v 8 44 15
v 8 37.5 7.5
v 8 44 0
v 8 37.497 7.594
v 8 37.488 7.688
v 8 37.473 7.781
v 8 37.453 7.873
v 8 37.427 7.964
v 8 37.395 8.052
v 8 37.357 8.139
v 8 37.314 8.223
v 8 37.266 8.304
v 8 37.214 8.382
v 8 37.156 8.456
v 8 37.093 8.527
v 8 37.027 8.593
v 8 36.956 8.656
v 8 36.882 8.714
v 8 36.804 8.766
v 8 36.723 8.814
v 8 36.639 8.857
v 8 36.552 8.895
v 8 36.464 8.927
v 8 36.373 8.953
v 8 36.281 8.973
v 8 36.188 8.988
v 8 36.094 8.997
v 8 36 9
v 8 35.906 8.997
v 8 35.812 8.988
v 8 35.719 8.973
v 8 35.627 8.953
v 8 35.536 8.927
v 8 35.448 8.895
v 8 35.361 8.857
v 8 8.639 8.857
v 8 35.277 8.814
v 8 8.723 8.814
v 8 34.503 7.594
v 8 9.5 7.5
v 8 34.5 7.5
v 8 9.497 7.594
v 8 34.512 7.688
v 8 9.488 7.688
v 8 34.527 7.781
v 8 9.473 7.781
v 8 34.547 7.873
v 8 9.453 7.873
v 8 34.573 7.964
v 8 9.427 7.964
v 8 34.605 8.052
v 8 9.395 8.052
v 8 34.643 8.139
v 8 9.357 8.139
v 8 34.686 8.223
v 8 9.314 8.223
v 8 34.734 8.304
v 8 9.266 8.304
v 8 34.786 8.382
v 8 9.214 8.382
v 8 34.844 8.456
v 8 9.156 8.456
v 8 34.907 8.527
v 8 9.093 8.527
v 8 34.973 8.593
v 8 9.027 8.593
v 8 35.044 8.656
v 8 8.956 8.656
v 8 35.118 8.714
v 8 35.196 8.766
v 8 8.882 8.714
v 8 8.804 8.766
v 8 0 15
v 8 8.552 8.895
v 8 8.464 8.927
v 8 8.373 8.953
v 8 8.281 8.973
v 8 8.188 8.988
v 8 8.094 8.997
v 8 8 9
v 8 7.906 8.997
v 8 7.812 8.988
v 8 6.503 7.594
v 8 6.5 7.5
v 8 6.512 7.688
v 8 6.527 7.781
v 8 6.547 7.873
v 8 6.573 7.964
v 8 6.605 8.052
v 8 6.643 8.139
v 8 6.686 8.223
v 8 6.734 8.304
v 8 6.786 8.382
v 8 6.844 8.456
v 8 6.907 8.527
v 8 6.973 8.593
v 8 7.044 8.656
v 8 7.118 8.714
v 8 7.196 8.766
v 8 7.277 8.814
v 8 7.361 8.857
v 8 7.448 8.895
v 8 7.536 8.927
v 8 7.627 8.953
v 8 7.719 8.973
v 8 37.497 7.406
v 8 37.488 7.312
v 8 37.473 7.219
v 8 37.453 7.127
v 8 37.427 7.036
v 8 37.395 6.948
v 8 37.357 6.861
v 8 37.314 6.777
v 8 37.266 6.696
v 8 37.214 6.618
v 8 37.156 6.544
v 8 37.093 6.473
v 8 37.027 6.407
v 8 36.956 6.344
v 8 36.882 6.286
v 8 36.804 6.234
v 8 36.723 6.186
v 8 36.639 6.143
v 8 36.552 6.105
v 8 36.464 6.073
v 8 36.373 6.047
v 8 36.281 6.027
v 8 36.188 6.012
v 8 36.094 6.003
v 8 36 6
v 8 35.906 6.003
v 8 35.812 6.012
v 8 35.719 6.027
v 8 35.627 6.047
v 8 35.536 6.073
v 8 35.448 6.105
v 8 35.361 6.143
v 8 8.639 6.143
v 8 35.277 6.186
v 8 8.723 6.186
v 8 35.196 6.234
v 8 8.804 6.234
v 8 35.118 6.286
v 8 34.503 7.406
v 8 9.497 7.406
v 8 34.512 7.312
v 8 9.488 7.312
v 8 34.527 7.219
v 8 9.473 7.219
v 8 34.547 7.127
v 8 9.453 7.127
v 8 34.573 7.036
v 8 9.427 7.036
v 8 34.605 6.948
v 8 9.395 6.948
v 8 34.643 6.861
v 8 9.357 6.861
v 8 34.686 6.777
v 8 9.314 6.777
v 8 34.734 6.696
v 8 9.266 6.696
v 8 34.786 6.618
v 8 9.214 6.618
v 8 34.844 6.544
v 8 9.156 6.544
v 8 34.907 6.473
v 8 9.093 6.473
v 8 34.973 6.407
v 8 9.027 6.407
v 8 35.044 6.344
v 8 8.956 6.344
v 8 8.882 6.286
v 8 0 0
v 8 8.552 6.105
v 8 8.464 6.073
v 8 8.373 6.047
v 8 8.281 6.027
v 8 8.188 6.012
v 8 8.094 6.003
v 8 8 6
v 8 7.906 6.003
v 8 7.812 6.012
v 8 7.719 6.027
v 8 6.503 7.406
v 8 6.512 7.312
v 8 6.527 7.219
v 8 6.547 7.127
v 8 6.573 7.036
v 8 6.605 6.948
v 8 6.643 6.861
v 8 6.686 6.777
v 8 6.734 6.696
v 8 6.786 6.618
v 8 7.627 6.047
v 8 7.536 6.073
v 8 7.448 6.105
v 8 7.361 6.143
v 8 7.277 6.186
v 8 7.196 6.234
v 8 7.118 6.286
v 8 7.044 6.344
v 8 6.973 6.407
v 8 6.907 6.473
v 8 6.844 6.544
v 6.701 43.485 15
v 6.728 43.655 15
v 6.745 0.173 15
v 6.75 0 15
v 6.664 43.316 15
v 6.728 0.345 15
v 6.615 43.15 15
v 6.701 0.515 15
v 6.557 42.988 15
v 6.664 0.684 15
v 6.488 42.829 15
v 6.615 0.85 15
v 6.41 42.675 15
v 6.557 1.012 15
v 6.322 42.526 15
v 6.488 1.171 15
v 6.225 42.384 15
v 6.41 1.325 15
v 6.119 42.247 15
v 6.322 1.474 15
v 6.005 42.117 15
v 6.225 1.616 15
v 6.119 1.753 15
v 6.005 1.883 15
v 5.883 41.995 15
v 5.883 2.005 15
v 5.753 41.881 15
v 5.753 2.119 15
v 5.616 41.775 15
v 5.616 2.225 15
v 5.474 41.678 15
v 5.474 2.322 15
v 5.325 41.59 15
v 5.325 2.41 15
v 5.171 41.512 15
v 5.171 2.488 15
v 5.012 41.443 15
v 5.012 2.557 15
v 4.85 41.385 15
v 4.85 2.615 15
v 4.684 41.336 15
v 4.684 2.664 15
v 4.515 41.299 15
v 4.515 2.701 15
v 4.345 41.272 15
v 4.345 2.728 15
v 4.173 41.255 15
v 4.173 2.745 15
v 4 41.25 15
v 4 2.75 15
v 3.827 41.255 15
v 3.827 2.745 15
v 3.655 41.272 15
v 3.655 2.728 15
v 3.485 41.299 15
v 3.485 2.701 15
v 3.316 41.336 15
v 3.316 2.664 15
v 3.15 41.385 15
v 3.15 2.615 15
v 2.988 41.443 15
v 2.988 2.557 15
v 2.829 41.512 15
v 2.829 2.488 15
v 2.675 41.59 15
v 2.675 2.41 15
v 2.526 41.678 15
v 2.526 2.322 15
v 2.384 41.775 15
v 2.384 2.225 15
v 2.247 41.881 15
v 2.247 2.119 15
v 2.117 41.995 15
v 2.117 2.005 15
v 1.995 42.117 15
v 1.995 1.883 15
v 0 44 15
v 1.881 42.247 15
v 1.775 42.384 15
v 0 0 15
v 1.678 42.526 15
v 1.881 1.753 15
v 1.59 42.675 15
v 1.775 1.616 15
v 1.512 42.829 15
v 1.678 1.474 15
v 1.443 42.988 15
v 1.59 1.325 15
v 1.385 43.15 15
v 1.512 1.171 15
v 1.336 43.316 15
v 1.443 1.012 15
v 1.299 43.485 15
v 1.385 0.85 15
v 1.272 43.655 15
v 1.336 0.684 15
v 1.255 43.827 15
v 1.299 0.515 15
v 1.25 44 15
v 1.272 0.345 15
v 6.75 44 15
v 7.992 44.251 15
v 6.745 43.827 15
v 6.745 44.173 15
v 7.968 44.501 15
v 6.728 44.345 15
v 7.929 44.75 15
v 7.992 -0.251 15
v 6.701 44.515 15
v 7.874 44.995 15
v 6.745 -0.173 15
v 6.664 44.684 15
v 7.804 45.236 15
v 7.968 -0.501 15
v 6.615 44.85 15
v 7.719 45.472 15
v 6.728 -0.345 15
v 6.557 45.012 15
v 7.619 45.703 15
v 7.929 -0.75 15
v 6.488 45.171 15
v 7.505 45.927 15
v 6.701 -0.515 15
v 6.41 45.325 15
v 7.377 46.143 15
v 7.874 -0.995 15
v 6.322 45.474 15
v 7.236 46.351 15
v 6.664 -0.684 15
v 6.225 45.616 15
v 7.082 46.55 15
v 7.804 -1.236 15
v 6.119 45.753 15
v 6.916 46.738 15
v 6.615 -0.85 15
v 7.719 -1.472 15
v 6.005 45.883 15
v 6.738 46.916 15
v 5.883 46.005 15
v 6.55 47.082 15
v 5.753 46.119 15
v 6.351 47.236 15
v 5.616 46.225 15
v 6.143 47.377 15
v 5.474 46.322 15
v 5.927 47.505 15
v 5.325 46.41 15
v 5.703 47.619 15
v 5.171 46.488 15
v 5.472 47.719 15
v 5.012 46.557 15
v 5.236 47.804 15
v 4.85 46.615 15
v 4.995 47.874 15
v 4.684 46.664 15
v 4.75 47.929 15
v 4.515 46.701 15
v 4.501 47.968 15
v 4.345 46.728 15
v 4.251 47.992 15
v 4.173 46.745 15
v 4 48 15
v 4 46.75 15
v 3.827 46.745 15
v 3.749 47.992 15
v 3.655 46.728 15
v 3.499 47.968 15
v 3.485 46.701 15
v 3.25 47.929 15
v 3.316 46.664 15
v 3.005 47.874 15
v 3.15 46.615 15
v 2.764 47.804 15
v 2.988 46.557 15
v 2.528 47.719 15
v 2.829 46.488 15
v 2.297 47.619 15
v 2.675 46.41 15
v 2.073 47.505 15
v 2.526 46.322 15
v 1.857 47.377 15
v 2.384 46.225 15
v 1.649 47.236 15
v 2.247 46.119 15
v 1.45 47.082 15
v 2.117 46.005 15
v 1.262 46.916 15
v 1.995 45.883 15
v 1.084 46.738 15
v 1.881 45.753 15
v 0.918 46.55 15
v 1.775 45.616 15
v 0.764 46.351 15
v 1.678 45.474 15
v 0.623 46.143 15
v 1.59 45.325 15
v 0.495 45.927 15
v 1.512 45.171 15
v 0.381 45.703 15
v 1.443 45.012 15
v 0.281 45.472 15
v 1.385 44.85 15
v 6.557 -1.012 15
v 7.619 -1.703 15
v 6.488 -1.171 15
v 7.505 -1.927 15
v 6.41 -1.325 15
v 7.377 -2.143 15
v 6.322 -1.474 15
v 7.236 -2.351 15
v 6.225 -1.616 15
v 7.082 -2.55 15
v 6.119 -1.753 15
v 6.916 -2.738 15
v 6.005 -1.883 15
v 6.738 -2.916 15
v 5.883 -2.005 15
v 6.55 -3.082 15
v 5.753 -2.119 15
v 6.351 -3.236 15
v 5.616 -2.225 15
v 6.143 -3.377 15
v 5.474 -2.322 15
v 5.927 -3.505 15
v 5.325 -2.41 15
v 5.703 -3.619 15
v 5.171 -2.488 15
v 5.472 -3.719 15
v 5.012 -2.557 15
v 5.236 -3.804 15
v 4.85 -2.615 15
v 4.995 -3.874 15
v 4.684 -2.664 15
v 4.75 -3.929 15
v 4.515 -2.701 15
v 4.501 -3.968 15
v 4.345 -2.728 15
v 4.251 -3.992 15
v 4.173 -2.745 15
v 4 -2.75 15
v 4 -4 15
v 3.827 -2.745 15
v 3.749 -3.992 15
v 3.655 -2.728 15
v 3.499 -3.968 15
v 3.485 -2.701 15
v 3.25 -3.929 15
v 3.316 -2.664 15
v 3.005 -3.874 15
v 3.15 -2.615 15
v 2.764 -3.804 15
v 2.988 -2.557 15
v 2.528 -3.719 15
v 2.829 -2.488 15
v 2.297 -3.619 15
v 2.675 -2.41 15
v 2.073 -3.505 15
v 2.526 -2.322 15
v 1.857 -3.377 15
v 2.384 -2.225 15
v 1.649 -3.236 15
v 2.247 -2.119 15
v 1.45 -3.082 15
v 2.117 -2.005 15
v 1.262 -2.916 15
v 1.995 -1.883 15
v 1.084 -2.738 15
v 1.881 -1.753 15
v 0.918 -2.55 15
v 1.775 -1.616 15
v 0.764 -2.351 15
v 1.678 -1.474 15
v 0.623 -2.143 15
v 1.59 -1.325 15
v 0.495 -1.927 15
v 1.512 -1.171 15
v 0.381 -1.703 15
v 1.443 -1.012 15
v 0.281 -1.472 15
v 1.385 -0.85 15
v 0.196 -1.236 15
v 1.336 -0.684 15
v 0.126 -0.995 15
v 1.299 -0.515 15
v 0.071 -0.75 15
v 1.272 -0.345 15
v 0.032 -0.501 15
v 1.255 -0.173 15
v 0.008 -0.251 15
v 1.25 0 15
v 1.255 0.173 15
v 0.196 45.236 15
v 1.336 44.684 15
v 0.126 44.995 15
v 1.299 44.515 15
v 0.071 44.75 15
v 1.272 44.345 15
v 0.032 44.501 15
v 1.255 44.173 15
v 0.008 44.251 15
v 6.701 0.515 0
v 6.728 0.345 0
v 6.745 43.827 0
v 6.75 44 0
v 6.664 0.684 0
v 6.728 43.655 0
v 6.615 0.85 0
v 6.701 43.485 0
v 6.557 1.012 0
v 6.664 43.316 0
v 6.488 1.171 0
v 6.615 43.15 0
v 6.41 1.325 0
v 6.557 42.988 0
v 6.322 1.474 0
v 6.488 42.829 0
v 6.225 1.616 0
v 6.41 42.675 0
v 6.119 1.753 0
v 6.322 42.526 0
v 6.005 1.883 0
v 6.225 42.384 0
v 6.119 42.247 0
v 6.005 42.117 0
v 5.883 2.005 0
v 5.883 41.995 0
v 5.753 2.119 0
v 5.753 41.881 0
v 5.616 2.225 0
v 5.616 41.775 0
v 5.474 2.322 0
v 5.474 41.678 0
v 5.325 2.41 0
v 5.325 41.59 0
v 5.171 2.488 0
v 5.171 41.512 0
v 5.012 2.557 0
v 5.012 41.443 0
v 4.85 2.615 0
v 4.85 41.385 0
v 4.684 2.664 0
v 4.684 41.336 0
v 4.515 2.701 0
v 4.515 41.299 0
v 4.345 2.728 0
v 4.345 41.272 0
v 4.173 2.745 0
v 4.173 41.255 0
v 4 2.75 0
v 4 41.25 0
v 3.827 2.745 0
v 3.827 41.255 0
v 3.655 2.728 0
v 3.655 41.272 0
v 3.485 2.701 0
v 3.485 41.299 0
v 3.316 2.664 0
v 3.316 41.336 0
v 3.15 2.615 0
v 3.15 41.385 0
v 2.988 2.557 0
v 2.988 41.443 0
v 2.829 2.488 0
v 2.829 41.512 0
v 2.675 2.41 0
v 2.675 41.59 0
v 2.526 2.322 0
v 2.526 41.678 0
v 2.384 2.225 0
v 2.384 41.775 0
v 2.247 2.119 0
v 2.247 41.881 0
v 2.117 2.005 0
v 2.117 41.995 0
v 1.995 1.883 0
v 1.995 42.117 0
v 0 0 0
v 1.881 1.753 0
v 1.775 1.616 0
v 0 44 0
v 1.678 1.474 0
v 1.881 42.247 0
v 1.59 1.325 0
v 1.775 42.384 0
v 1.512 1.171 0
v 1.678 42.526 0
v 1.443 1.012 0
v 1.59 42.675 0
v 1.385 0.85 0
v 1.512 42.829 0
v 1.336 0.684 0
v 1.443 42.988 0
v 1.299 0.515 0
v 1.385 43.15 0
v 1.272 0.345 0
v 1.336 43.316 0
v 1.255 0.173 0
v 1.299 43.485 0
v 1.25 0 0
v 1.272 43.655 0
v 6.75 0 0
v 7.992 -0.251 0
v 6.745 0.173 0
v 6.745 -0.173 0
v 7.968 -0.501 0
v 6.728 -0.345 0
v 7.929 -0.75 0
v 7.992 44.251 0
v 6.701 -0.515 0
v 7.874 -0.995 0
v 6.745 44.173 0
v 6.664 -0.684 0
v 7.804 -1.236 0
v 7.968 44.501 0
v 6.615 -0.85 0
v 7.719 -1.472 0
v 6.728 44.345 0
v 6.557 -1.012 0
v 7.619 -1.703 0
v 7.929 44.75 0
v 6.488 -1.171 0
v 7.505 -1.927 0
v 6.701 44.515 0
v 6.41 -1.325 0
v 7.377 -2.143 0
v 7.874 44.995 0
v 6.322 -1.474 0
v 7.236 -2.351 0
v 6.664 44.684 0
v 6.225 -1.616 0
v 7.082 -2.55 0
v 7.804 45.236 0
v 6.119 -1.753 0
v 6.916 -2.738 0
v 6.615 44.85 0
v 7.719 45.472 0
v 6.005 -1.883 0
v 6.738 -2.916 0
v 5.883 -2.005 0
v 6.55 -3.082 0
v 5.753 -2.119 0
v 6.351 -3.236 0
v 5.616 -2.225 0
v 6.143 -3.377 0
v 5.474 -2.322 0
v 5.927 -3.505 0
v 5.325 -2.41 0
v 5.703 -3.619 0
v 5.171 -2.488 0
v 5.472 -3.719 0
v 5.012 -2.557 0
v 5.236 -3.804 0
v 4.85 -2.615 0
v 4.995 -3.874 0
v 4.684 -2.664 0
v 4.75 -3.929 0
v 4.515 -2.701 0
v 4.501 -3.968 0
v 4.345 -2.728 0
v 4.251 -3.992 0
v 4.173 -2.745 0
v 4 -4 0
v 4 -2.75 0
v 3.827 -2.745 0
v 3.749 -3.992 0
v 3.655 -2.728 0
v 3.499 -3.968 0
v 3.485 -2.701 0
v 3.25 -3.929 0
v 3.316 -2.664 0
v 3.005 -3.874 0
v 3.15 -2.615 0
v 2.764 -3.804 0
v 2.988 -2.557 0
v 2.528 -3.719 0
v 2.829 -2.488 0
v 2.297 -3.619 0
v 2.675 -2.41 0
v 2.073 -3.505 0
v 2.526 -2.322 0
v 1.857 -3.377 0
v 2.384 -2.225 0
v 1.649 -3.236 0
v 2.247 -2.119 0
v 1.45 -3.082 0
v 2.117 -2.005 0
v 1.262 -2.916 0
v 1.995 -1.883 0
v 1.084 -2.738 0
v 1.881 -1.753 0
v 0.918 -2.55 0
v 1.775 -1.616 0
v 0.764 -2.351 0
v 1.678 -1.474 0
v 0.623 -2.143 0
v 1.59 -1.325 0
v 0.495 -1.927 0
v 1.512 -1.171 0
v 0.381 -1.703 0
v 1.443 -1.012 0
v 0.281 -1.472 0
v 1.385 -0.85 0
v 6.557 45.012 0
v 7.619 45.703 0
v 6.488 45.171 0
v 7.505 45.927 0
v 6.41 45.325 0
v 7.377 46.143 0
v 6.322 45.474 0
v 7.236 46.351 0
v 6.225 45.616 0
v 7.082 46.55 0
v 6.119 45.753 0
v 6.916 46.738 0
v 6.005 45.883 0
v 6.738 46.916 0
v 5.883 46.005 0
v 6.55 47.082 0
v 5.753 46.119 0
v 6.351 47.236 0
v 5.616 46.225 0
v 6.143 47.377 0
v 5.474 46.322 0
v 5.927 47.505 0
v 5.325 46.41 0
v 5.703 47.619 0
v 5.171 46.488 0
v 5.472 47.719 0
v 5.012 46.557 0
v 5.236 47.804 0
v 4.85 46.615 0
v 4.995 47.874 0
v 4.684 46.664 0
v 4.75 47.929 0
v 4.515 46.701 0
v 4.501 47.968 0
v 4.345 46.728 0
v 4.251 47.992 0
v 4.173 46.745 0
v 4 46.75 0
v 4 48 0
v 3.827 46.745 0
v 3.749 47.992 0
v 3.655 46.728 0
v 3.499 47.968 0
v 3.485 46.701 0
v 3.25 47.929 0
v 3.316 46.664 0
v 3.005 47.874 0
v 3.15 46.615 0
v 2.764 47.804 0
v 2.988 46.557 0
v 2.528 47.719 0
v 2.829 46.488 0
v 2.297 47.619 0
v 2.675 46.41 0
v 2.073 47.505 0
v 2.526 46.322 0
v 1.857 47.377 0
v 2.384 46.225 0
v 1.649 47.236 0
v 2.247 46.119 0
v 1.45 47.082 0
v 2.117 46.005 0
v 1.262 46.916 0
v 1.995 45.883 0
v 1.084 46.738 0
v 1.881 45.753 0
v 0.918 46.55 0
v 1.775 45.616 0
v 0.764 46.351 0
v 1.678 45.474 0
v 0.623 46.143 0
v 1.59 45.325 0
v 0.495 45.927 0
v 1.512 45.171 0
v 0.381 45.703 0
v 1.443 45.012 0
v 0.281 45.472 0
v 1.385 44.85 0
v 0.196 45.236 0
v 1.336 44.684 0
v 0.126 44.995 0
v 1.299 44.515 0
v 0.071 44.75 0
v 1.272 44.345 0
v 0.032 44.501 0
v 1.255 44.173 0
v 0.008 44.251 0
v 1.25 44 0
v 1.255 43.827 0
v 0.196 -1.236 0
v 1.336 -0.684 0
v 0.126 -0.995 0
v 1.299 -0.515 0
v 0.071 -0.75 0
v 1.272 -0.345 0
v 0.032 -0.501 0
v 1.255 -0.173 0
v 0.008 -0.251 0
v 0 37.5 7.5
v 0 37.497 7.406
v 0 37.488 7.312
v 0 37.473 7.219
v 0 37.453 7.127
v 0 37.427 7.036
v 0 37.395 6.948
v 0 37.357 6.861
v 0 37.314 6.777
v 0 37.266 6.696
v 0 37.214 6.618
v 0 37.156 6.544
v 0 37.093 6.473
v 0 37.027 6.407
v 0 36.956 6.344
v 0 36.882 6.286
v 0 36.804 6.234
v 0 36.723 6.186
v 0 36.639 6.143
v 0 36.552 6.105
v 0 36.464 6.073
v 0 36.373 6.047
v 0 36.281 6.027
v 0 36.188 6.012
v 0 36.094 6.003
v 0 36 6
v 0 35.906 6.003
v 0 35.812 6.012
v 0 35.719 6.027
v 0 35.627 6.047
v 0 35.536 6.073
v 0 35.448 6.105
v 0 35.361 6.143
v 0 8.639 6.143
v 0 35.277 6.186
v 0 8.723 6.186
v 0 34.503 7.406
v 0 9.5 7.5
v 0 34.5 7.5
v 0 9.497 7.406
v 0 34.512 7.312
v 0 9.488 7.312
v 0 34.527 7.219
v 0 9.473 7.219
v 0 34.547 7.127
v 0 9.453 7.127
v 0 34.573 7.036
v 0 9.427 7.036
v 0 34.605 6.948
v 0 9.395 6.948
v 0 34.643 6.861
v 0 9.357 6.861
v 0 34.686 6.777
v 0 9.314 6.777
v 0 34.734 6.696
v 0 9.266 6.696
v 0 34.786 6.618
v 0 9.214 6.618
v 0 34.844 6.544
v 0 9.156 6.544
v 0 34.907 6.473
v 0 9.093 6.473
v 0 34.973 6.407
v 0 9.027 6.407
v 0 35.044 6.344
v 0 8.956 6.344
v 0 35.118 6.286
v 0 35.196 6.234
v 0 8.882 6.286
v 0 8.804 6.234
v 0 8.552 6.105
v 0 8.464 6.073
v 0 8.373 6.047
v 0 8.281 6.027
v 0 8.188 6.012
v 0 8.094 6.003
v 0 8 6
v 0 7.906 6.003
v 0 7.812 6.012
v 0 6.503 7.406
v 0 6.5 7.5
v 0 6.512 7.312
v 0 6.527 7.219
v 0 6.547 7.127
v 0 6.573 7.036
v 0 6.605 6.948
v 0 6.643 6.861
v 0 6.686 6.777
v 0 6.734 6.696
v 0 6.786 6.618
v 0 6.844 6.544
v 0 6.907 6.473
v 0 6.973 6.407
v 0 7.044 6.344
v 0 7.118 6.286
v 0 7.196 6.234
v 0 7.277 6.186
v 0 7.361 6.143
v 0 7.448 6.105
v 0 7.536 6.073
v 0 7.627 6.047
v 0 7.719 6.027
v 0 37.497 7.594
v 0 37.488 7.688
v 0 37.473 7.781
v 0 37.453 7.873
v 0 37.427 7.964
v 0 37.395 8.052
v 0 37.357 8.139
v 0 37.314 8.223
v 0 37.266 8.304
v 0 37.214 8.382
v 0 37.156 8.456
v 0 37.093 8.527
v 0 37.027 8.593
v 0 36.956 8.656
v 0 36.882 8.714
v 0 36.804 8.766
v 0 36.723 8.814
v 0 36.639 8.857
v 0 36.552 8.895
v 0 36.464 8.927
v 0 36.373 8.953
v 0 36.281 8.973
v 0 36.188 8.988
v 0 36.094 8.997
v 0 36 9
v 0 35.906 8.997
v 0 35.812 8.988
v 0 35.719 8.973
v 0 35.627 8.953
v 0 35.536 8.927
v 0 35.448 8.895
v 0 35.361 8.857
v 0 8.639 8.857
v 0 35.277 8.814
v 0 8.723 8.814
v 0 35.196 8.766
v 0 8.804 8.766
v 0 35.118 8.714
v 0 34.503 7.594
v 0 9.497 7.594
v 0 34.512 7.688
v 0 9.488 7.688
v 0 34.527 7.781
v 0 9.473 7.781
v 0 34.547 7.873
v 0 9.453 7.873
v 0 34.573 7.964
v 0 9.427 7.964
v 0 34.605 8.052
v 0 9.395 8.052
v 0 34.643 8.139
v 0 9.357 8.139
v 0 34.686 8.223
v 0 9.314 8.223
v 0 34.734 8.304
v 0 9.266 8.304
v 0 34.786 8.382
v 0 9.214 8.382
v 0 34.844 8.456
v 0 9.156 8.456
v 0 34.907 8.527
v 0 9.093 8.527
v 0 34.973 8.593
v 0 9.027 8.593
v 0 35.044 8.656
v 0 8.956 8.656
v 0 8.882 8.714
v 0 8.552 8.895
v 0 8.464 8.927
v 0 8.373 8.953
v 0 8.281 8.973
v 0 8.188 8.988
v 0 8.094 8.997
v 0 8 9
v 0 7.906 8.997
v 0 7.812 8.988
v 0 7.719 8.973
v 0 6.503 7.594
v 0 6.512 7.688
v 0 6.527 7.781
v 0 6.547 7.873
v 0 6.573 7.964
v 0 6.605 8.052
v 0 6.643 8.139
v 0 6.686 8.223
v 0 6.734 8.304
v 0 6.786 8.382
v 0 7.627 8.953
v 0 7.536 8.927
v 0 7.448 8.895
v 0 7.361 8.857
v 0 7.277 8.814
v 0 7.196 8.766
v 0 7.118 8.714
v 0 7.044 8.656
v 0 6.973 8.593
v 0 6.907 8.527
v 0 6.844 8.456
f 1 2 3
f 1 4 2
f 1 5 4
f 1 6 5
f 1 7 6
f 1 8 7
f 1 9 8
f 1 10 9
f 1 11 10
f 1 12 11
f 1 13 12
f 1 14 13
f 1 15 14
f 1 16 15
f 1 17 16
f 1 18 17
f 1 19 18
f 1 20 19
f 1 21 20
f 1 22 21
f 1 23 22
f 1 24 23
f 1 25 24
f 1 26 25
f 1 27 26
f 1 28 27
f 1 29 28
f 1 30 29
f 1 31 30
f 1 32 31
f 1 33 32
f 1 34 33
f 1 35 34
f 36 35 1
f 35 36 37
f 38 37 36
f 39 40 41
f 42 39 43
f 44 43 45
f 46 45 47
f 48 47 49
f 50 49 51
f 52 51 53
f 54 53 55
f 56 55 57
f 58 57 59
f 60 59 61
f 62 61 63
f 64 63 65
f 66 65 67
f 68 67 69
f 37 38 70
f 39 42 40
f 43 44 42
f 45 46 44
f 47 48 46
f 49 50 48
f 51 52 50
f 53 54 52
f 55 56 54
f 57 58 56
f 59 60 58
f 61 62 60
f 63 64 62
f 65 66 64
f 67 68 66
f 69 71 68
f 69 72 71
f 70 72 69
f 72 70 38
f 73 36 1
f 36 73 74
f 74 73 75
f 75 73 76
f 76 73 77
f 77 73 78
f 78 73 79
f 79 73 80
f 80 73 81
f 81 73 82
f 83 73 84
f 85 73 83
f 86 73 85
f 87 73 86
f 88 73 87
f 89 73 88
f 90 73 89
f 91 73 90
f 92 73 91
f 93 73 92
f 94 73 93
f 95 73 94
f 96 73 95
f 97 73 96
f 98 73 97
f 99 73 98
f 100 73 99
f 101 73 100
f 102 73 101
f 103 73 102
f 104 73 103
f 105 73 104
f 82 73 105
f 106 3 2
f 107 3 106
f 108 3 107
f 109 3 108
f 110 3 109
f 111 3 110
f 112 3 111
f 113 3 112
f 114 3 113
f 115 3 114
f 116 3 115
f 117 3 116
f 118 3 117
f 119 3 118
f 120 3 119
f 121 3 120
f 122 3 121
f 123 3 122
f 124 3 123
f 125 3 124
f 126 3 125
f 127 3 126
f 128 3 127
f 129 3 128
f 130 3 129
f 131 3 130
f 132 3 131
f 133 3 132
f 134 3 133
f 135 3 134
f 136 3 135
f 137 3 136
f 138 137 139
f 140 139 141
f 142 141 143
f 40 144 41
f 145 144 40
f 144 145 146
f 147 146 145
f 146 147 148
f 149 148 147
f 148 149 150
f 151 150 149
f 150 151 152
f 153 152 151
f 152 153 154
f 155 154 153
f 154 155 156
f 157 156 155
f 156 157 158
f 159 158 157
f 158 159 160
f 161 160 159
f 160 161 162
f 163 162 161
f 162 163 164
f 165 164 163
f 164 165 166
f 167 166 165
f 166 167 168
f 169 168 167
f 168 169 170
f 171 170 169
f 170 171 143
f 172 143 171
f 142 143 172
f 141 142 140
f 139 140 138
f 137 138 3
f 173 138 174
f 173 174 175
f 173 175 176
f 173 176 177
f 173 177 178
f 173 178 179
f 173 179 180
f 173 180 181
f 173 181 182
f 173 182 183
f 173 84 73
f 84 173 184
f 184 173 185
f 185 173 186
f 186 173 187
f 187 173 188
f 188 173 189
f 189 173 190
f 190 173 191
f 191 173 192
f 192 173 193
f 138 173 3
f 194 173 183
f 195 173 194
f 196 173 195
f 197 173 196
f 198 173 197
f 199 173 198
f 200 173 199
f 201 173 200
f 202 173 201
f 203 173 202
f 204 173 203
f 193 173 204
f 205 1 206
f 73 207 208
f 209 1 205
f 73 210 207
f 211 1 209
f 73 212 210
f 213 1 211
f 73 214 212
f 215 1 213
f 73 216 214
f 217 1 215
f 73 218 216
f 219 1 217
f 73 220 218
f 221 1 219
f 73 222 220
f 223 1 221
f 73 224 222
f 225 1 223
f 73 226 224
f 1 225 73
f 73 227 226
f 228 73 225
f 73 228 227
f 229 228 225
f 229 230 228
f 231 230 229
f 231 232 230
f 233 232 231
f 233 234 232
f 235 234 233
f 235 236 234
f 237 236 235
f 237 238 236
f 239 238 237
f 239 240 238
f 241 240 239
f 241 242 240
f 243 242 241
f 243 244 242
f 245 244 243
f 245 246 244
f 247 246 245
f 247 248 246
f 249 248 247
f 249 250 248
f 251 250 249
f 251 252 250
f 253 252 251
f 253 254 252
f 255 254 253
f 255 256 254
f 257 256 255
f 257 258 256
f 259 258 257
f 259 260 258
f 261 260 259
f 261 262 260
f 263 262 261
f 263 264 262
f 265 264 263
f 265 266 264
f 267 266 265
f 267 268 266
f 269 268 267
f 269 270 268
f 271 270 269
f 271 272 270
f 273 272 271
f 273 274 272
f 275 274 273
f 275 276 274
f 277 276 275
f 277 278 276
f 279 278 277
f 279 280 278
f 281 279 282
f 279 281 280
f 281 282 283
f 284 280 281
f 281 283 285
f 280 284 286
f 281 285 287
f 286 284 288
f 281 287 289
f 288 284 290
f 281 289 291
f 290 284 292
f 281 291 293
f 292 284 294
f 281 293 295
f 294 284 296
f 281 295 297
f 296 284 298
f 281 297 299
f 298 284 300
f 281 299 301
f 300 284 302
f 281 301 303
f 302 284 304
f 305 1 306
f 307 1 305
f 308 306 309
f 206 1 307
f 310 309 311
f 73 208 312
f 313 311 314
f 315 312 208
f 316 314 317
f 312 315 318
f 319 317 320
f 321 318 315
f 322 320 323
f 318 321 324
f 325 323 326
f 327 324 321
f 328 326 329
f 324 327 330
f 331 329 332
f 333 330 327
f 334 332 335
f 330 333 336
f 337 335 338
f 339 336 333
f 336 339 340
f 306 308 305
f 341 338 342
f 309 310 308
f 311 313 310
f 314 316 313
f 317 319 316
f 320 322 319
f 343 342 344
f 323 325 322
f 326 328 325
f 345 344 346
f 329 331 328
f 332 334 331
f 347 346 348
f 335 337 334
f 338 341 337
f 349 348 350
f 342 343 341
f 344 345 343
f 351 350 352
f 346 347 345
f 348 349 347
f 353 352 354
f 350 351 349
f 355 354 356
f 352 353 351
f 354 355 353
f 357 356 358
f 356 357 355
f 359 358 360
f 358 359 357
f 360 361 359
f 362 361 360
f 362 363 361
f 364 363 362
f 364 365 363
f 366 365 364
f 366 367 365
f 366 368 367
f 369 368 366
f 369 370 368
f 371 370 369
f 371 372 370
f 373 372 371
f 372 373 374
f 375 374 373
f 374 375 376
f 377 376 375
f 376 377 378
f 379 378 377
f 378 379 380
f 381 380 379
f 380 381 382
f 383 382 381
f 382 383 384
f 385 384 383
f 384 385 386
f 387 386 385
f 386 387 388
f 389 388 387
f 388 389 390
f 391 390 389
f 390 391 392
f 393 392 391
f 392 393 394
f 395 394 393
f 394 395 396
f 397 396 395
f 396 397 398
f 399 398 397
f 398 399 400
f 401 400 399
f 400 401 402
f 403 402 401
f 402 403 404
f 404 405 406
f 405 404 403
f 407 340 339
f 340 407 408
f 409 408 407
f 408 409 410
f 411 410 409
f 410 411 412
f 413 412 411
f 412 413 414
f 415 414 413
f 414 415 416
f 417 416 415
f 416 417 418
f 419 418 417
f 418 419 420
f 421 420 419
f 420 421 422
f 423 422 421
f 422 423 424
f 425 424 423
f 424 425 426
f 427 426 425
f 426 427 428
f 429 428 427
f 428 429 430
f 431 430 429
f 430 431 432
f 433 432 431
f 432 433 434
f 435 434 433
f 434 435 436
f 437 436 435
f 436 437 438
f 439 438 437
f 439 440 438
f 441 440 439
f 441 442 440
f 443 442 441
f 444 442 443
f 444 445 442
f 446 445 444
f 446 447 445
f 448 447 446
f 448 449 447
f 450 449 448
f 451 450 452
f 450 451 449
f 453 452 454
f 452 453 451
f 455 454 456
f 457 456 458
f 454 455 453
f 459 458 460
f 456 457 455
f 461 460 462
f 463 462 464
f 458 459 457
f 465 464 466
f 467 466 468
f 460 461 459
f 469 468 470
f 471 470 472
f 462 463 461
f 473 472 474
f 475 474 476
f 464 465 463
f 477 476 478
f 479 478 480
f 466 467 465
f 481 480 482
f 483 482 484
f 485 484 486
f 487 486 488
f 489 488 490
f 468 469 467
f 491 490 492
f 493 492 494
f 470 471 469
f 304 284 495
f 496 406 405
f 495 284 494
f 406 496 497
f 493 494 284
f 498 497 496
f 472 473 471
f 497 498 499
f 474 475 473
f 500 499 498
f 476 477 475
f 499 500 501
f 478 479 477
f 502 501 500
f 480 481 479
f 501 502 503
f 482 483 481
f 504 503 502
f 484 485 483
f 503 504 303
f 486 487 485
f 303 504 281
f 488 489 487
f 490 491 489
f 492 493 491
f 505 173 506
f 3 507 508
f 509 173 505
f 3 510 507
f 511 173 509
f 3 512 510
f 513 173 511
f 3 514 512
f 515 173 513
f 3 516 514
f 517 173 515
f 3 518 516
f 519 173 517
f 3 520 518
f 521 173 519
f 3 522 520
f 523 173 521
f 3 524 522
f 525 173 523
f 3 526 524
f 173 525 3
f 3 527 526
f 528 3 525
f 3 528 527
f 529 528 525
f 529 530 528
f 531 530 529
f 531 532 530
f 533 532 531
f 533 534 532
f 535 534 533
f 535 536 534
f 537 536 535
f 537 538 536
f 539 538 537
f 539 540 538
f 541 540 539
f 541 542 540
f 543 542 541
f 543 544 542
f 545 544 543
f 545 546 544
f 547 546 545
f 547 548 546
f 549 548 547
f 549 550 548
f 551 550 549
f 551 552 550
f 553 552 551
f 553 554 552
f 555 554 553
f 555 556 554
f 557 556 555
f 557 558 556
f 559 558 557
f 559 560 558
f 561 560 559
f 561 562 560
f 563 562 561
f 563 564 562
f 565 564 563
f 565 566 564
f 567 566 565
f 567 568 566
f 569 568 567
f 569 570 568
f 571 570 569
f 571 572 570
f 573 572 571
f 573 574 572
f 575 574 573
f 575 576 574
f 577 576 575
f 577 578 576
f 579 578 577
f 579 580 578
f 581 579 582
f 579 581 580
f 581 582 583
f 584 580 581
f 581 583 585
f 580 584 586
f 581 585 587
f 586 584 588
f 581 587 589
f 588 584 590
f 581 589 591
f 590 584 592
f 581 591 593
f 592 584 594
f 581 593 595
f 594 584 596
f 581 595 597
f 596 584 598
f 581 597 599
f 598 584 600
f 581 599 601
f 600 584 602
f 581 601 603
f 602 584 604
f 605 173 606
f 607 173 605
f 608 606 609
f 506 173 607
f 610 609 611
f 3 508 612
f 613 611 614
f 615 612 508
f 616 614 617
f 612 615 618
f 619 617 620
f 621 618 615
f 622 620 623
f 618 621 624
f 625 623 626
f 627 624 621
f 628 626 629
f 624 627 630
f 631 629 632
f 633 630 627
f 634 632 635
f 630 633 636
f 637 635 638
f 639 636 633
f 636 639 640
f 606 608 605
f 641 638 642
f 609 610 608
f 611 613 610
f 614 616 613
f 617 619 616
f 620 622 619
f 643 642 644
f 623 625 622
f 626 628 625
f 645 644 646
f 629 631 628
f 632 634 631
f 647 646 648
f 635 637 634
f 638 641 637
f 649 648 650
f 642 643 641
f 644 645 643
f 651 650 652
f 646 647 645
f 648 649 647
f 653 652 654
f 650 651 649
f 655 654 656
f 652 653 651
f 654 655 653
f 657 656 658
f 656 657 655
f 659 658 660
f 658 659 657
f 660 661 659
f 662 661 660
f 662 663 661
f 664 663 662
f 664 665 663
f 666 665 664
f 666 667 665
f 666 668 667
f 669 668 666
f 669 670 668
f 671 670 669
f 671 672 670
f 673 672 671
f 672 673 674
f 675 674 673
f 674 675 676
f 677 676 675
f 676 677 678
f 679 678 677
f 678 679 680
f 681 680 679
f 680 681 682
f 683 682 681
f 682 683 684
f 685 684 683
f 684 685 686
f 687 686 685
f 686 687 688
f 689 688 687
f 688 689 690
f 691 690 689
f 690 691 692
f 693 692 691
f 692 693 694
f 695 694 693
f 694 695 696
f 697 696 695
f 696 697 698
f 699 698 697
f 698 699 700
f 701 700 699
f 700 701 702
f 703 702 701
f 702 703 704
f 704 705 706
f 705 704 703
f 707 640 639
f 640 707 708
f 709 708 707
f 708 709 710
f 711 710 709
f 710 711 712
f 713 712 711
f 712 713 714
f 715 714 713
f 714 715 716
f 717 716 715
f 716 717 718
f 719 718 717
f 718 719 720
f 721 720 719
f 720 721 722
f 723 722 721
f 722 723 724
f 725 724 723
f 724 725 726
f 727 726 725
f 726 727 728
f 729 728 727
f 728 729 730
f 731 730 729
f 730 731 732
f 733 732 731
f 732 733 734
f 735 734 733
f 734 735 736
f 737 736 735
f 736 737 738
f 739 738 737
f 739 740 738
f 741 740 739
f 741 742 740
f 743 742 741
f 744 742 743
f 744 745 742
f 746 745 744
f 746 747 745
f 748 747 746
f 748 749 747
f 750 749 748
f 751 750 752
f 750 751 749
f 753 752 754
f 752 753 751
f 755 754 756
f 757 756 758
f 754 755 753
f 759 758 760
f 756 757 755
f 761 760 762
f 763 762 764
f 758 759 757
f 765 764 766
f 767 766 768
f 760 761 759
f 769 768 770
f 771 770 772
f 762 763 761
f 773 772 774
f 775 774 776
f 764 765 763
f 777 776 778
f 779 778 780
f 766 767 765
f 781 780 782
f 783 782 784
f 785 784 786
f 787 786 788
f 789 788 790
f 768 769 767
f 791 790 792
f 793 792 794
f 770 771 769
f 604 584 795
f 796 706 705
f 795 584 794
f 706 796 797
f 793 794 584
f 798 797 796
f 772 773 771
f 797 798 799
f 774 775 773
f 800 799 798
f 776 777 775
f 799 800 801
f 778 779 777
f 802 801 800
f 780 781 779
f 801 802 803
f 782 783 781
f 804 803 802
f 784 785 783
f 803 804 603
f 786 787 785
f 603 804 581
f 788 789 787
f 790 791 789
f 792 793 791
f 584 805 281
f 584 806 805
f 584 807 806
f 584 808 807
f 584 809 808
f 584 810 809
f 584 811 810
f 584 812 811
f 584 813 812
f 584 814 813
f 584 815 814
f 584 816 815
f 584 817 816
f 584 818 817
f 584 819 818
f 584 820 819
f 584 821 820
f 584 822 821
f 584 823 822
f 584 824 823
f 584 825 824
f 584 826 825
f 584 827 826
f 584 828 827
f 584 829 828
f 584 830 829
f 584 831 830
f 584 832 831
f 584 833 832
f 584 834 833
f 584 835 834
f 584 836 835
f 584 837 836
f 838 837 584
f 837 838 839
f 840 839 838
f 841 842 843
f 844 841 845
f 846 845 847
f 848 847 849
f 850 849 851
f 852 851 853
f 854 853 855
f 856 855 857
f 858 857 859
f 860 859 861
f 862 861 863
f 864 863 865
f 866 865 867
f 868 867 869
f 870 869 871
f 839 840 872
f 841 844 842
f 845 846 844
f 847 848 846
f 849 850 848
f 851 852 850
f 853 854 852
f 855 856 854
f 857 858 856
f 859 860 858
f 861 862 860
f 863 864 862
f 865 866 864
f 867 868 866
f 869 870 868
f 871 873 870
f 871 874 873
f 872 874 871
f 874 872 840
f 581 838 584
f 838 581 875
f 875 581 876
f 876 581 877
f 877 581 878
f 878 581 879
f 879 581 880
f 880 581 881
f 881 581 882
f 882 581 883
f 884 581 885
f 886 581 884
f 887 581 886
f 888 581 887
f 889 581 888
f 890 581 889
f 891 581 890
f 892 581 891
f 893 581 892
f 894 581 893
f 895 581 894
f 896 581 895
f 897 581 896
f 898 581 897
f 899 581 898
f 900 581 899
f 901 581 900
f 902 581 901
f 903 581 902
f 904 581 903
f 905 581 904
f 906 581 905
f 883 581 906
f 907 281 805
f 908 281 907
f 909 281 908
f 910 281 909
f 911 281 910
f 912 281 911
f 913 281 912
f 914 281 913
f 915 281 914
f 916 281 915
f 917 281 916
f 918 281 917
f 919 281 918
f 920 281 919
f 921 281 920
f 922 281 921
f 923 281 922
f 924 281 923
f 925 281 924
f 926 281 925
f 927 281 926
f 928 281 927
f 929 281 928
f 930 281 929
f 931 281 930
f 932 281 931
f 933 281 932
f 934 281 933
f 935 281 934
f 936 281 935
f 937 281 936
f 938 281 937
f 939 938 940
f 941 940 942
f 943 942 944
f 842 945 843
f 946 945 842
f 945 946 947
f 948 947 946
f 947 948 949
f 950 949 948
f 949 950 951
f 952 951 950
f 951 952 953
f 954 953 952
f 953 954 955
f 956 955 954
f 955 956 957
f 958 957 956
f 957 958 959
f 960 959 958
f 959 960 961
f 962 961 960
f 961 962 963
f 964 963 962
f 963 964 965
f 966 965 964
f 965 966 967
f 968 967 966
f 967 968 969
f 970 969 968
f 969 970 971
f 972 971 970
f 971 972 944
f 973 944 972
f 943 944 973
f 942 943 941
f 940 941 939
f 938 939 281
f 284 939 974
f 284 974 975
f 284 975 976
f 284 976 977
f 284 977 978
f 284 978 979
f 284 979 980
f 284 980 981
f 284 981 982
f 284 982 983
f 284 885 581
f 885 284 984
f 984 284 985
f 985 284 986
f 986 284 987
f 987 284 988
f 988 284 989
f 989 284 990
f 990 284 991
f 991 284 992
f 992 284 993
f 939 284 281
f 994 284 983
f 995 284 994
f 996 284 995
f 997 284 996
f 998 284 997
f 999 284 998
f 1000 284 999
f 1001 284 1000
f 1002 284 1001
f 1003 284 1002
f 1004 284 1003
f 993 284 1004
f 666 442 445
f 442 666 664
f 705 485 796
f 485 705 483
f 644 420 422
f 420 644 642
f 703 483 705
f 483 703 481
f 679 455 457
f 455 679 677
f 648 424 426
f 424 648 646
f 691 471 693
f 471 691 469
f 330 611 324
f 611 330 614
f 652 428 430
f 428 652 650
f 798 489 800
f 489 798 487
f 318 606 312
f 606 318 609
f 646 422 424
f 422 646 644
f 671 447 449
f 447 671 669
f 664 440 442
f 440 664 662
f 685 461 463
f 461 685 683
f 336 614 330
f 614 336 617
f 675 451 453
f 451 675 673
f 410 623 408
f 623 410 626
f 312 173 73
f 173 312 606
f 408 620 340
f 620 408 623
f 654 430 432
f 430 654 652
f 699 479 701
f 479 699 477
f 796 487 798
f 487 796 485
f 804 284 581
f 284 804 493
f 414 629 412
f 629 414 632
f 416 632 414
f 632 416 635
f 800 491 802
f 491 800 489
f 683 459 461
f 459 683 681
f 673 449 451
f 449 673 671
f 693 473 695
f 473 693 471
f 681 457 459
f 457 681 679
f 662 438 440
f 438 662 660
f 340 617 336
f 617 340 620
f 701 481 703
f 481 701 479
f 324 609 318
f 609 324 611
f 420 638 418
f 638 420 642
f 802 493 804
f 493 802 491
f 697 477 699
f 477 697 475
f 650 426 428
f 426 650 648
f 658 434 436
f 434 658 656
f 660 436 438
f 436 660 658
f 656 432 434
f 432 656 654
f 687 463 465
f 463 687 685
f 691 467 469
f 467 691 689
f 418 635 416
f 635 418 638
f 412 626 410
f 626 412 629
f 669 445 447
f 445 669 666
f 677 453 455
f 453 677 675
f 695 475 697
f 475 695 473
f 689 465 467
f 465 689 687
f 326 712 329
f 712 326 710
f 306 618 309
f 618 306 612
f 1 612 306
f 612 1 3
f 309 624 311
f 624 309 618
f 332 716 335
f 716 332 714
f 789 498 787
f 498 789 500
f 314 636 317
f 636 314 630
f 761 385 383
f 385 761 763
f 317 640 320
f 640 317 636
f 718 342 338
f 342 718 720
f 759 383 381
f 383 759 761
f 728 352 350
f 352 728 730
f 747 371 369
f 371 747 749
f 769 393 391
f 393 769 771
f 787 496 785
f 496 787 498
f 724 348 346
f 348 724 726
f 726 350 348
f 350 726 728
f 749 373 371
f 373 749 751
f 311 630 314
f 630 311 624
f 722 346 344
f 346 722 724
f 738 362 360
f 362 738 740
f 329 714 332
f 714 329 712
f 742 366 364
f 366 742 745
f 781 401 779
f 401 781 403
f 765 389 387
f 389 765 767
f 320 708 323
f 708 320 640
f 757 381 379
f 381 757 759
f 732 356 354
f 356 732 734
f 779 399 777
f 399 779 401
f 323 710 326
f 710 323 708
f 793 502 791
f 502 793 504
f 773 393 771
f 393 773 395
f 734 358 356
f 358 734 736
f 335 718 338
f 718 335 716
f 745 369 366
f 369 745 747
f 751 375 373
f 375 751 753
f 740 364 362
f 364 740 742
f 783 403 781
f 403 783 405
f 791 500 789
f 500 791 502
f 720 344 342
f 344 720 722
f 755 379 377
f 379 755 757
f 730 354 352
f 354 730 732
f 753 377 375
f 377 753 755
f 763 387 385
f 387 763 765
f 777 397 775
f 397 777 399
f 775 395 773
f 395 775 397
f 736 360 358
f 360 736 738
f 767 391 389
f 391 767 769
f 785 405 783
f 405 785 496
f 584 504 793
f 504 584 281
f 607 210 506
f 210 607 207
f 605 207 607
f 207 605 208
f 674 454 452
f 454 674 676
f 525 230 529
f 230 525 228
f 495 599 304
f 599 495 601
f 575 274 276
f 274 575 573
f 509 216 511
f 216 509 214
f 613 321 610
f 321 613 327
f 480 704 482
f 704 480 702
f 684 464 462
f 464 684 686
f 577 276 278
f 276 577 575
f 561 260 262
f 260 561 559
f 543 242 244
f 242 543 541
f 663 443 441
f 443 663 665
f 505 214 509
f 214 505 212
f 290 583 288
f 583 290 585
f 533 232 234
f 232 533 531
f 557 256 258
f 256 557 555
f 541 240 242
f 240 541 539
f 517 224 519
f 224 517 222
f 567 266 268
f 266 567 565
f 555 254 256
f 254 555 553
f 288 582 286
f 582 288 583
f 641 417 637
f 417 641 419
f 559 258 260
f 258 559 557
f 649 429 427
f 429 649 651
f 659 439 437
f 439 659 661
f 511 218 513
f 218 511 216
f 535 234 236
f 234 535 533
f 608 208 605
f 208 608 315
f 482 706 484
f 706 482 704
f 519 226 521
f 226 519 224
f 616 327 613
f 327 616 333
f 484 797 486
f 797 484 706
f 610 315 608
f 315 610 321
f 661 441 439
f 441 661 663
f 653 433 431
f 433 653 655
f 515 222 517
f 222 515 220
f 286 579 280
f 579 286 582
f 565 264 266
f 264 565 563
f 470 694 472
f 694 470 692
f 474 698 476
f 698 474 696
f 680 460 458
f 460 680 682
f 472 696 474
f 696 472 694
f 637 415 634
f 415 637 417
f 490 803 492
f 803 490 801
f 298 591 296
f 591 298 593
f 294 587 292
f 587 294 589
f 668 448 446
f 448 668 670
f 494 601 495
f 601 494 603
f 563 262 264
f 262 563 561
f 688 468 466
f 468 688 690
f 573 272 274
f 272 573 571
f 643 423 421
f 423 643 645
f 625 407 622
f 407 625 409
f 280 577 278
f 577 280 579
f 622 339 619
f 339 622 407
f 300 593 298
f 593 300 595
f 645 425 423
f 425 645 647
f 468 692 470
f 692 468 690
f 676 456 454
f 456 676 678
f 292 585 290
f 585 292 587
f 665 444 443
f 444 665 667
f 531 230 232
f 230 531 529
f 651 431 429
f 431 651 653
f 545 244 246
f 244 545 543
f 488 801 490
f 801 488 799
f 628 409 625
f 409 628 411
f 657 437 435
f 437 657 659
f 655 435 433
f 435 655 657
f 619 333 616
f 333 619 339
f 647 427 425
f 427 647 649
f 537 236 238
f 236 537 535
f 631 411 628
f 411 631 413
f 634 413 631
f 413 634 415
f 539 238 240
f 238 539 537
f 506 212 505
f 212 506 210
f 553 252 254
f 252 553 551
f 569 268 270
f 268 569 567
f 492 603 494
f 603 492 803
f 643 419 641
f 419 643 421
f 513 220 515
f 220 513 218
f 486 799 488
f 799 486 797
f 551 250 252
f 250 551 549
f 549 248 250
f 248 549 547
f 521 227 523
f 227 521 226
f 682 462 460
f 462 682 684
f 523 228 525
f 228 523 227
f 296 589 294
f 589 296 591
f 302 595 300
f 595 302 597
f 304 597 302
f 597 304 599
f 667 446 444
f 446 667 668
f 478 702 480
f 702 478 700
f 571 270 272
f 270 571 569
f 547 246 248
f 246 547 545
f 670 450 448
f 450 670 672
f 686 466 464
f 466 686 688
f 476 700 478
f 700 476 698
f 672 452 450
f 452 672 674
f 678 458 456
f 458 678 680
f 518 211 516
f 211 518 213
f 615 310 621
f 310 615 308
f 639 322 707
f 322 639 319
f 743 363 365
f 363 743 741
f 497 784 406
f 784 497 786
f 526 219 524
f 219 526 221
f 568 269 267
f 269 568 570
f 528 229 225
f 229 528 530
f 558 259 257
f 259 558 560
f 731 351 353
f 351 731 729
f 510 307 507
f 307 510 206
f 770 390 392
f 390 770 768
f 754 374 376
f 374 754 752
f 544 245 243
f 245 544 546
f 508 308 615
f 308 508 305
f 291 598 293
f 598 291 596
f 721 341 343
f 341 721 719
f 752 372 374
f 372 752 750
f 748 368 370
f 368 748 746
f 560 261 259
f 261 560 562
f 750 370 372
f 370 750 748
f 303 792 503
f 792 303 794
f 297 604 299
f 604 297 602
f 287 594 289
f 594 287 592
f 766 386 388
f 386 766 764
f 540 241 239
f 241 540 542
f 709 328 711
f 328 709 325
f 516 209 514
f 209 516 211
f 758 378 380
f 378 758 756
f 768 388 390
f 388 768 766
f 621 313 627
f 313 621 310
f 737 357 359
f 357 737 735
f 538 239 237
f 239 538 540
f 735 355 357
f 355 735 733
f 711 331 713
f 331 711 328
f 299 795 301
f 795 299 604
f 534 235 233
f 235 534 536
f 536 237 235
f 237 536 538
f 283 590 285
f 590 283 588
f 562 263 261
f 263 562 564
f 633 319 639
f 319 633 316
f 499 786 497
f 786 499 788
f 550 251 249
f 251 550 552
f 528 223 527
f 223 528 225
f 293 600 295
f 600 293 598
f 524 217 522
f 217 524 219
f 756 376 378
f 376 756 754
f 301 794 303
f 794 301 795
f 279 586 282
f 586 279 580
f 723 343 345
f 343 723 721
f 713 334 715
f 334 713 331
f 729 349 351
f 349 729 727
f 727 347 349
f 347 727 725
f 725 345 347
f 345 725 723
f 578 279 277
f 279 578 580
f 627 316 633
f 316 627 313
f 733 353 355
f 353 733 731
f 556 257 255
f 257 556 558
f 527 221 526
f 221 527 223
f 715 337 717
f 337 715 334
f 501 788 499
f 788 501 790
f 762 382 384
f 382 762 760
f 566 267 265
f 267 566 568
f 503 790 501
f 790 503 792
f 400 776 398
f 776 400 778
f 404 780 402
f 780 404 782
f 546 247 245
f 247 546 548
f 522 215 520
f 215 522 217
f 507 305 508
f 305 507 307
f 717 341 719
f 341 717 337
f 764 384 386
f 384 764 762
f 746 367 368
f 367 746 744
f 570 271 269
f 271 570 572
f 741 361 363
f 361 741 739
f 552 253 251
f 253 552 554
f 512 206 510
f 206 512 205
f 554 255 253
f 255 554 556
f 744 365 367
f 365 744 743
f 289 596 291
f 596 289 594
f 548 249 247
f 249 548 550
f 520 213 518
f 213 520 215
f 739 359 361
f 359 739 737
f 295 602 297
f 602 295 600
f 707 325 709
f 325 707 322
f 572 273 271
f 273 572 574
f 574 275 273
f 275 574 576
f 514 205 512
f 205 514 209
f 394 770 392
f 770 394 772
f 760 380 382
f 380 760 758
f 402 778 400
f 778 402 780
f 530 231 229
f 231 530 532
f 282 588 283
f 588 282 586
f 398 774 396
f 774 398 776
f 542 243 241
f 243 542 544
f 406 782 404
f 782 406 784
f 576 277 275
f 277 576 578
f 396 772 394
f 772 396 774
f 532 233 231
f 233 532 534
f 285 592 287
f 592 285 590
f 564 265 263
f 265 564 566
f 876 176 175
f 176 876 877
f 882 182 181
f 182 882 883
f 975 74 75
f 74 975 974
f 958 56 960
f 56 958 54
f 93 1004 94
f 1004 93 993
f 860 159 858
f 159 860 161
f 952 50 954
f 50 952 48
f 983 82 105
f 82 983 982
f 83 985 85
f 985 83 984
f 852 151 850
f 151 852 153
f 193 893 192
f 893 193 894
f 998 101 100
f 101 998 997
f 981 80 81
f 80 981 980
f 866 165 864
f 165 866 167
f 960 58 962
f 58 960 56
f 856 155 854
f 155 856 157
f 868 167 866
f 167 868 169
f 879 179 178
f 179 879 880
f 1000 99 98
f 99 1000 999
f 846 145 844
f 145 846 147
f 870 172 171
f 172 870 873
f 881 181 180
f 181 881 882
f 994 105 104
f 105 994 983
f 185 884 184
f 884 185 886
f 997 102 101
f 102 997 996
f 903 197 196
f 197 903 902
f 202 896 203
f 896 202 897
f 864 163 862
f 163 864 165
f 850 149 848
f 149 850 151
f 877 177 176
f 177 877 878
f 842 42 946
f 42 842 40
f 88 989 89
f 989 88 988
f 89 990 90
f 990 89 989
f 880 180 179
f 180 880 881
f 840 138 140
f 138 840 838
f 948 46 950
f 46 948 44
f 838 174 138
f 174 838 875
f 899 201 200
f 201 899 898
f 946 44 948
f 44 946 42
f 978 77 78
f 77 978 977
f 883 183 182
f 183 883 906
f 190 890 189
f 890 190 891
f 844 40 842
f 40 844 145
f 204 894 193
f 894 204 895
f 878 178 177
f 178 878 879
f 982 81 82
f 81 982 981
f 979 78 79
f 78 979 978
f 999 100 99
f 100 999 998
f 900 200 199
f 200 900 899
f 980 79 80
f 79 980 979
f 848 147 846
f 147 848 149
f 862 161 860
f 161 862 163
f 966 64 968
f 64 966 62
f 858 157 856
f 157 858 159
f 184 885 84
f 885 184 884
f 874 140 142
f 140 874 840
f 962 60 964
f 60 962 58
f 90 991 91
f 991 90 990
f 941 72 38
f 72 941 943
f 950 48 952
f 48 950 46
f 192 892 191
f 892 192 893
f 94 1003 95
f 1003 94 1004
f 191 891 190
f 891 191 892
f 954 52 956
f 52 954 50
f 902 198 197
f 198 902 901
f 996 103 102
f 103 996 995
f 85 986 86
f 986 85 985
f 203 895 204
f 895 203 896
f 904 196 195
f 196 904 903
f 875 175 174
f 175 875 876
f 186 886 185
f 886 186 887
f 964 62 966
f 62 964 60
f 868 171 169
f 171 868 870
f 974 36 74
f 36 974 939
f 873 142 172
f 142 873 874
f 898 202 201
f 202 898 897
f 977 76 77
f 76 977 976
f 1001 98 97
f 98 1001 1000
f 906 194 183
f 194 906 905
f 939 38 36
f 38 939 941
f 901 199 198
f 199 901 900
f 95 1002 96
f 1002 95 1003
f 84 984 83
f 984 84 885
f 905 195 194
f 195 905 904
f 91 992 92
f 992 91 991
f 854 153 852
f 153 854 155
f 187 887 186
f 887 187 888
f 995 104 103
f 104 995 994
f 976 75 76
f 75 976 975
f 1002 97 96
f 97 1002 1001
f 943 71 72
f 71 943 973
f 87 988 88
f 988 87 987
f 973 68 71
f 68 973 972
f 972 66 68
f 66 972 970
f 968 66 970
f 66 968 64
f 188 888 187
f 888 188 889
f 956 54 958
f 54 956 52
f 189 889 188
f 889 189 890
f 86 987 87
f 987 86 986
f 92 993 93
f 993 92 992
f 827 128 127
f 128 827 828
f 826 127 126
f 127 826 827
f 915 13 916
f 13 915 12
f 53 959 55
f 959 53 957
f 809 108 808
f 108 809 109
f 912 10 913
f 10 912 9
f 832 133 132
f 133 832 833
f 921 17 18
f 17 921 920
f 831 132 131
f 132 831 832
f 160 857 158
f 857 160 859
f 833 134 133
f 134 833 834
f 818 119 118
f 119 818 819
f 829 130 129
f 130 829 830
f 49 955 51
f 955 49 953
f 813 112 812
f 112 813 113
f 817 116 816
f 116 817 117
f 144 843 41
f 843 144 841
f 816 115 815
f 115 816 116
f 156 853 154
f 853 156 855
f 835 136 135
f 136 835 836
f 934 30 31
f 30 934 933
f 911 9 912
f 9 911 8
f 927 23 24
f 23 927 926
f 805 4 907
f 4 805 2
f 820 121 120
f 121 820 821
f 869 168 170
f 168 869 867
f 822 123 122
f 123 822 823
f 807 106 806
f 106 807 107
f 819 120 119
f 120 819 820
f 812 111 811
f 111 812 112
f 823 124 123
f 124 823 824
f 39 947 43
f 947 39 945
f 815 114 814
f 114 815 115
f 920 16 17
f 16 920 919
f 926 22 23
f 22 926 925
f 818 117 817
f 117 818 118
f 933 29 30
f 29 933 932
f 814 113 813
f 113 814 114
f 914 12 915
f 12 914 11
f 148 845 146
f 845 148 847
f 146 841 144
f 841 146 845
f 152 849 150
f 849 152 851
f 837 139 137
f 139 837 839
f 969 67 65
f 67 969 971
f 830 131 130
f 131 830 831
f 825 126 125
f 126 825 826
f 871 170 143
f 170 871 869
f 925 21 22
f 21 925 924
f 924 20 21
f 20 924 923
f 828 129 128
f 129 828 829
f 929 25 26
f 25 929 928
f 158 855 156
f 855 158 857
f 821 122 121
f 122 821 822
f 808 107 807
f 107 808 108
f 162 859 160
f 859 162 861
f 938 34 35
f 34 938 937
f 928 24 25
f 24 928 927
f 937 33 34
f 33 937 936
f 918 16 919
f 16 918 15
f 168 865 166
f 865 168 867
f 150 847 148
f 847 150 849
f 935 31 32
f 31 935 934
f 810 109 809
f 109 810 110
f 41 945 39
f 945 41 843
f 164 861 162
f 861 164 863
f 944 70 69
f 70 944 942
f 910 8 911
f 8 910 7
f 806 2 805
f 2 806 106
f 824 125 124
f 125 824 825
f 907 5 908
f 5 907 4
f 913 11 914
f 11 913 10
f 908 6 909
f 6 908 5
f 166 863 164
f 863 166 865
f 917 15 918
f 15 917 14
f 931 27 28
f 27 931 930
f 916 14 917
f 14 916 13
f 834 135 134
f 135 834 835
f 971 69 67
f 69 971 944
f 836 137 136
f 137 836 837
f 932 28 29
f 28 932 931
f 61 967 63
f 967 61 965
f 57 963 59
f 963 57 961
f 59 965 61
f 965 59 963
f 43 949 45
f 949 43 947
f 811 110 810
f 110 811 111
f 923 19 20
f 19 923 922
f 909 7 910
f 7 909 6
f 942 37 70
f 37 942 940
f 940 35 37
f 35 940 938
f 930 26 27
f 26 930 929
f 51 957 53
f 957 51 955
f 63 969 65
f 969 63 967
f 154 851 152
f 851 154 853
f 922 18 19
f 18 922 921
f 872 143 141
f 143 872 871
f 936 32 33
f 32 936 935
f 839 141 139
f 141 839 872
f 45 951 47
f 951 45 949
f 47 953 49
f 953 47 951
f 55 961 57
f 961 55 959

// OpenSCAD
/*

Description: those spacers are used to assemble my rocket payload altimeters plate. You will need a minimum of 2 of those
Author: Boris du Reau
Date: 24/08/2018
Lenght between rod holes: 44mm
*/
$fn=100; 
// diameter of the holes used to screw the altimeter plate
plate_hole_diam= 3;
spacer_width = 15;
spacer_rod_diam = 5.5;
//lenght between the rod hols
spacer_length= 44;
spacer_height=8;

// main spacer
module spacer() {
cube ([spacer_height,spacer_length,spacer_width ]);
translate ([spacer_height/2, 0,0]) cylinder (h=spacer_width, r=spacer_height/2);
translate ([spacer_height/2, spacer_length,0]) cylinder (h=spacer_width, r=spacer_height/2);
}

difference () {
    spacer();
    // rod holes
    translate ([spacer_height/2, 0,0])cylinder(h=spacer_width, r=spacer_rod_diam/2);
    translate ([spacer_height/2, spacer_length,0])cylinder(h=spacer_width, r=spacer_rod_diam/2);
    //holes to screw the altimeters plate
    rotate ([0,90,0]) translate ([-spacer_width/2,spacer_height,0])cylinder(h=spacer_width, r=plate_hole_diam/2);
    rotate ([0,90,0]) translate ([-spacer_width/2,spacer_length-spacer_height,0])cylinder(h=spacer_width, r=plate_hole_diam/2);  
}
